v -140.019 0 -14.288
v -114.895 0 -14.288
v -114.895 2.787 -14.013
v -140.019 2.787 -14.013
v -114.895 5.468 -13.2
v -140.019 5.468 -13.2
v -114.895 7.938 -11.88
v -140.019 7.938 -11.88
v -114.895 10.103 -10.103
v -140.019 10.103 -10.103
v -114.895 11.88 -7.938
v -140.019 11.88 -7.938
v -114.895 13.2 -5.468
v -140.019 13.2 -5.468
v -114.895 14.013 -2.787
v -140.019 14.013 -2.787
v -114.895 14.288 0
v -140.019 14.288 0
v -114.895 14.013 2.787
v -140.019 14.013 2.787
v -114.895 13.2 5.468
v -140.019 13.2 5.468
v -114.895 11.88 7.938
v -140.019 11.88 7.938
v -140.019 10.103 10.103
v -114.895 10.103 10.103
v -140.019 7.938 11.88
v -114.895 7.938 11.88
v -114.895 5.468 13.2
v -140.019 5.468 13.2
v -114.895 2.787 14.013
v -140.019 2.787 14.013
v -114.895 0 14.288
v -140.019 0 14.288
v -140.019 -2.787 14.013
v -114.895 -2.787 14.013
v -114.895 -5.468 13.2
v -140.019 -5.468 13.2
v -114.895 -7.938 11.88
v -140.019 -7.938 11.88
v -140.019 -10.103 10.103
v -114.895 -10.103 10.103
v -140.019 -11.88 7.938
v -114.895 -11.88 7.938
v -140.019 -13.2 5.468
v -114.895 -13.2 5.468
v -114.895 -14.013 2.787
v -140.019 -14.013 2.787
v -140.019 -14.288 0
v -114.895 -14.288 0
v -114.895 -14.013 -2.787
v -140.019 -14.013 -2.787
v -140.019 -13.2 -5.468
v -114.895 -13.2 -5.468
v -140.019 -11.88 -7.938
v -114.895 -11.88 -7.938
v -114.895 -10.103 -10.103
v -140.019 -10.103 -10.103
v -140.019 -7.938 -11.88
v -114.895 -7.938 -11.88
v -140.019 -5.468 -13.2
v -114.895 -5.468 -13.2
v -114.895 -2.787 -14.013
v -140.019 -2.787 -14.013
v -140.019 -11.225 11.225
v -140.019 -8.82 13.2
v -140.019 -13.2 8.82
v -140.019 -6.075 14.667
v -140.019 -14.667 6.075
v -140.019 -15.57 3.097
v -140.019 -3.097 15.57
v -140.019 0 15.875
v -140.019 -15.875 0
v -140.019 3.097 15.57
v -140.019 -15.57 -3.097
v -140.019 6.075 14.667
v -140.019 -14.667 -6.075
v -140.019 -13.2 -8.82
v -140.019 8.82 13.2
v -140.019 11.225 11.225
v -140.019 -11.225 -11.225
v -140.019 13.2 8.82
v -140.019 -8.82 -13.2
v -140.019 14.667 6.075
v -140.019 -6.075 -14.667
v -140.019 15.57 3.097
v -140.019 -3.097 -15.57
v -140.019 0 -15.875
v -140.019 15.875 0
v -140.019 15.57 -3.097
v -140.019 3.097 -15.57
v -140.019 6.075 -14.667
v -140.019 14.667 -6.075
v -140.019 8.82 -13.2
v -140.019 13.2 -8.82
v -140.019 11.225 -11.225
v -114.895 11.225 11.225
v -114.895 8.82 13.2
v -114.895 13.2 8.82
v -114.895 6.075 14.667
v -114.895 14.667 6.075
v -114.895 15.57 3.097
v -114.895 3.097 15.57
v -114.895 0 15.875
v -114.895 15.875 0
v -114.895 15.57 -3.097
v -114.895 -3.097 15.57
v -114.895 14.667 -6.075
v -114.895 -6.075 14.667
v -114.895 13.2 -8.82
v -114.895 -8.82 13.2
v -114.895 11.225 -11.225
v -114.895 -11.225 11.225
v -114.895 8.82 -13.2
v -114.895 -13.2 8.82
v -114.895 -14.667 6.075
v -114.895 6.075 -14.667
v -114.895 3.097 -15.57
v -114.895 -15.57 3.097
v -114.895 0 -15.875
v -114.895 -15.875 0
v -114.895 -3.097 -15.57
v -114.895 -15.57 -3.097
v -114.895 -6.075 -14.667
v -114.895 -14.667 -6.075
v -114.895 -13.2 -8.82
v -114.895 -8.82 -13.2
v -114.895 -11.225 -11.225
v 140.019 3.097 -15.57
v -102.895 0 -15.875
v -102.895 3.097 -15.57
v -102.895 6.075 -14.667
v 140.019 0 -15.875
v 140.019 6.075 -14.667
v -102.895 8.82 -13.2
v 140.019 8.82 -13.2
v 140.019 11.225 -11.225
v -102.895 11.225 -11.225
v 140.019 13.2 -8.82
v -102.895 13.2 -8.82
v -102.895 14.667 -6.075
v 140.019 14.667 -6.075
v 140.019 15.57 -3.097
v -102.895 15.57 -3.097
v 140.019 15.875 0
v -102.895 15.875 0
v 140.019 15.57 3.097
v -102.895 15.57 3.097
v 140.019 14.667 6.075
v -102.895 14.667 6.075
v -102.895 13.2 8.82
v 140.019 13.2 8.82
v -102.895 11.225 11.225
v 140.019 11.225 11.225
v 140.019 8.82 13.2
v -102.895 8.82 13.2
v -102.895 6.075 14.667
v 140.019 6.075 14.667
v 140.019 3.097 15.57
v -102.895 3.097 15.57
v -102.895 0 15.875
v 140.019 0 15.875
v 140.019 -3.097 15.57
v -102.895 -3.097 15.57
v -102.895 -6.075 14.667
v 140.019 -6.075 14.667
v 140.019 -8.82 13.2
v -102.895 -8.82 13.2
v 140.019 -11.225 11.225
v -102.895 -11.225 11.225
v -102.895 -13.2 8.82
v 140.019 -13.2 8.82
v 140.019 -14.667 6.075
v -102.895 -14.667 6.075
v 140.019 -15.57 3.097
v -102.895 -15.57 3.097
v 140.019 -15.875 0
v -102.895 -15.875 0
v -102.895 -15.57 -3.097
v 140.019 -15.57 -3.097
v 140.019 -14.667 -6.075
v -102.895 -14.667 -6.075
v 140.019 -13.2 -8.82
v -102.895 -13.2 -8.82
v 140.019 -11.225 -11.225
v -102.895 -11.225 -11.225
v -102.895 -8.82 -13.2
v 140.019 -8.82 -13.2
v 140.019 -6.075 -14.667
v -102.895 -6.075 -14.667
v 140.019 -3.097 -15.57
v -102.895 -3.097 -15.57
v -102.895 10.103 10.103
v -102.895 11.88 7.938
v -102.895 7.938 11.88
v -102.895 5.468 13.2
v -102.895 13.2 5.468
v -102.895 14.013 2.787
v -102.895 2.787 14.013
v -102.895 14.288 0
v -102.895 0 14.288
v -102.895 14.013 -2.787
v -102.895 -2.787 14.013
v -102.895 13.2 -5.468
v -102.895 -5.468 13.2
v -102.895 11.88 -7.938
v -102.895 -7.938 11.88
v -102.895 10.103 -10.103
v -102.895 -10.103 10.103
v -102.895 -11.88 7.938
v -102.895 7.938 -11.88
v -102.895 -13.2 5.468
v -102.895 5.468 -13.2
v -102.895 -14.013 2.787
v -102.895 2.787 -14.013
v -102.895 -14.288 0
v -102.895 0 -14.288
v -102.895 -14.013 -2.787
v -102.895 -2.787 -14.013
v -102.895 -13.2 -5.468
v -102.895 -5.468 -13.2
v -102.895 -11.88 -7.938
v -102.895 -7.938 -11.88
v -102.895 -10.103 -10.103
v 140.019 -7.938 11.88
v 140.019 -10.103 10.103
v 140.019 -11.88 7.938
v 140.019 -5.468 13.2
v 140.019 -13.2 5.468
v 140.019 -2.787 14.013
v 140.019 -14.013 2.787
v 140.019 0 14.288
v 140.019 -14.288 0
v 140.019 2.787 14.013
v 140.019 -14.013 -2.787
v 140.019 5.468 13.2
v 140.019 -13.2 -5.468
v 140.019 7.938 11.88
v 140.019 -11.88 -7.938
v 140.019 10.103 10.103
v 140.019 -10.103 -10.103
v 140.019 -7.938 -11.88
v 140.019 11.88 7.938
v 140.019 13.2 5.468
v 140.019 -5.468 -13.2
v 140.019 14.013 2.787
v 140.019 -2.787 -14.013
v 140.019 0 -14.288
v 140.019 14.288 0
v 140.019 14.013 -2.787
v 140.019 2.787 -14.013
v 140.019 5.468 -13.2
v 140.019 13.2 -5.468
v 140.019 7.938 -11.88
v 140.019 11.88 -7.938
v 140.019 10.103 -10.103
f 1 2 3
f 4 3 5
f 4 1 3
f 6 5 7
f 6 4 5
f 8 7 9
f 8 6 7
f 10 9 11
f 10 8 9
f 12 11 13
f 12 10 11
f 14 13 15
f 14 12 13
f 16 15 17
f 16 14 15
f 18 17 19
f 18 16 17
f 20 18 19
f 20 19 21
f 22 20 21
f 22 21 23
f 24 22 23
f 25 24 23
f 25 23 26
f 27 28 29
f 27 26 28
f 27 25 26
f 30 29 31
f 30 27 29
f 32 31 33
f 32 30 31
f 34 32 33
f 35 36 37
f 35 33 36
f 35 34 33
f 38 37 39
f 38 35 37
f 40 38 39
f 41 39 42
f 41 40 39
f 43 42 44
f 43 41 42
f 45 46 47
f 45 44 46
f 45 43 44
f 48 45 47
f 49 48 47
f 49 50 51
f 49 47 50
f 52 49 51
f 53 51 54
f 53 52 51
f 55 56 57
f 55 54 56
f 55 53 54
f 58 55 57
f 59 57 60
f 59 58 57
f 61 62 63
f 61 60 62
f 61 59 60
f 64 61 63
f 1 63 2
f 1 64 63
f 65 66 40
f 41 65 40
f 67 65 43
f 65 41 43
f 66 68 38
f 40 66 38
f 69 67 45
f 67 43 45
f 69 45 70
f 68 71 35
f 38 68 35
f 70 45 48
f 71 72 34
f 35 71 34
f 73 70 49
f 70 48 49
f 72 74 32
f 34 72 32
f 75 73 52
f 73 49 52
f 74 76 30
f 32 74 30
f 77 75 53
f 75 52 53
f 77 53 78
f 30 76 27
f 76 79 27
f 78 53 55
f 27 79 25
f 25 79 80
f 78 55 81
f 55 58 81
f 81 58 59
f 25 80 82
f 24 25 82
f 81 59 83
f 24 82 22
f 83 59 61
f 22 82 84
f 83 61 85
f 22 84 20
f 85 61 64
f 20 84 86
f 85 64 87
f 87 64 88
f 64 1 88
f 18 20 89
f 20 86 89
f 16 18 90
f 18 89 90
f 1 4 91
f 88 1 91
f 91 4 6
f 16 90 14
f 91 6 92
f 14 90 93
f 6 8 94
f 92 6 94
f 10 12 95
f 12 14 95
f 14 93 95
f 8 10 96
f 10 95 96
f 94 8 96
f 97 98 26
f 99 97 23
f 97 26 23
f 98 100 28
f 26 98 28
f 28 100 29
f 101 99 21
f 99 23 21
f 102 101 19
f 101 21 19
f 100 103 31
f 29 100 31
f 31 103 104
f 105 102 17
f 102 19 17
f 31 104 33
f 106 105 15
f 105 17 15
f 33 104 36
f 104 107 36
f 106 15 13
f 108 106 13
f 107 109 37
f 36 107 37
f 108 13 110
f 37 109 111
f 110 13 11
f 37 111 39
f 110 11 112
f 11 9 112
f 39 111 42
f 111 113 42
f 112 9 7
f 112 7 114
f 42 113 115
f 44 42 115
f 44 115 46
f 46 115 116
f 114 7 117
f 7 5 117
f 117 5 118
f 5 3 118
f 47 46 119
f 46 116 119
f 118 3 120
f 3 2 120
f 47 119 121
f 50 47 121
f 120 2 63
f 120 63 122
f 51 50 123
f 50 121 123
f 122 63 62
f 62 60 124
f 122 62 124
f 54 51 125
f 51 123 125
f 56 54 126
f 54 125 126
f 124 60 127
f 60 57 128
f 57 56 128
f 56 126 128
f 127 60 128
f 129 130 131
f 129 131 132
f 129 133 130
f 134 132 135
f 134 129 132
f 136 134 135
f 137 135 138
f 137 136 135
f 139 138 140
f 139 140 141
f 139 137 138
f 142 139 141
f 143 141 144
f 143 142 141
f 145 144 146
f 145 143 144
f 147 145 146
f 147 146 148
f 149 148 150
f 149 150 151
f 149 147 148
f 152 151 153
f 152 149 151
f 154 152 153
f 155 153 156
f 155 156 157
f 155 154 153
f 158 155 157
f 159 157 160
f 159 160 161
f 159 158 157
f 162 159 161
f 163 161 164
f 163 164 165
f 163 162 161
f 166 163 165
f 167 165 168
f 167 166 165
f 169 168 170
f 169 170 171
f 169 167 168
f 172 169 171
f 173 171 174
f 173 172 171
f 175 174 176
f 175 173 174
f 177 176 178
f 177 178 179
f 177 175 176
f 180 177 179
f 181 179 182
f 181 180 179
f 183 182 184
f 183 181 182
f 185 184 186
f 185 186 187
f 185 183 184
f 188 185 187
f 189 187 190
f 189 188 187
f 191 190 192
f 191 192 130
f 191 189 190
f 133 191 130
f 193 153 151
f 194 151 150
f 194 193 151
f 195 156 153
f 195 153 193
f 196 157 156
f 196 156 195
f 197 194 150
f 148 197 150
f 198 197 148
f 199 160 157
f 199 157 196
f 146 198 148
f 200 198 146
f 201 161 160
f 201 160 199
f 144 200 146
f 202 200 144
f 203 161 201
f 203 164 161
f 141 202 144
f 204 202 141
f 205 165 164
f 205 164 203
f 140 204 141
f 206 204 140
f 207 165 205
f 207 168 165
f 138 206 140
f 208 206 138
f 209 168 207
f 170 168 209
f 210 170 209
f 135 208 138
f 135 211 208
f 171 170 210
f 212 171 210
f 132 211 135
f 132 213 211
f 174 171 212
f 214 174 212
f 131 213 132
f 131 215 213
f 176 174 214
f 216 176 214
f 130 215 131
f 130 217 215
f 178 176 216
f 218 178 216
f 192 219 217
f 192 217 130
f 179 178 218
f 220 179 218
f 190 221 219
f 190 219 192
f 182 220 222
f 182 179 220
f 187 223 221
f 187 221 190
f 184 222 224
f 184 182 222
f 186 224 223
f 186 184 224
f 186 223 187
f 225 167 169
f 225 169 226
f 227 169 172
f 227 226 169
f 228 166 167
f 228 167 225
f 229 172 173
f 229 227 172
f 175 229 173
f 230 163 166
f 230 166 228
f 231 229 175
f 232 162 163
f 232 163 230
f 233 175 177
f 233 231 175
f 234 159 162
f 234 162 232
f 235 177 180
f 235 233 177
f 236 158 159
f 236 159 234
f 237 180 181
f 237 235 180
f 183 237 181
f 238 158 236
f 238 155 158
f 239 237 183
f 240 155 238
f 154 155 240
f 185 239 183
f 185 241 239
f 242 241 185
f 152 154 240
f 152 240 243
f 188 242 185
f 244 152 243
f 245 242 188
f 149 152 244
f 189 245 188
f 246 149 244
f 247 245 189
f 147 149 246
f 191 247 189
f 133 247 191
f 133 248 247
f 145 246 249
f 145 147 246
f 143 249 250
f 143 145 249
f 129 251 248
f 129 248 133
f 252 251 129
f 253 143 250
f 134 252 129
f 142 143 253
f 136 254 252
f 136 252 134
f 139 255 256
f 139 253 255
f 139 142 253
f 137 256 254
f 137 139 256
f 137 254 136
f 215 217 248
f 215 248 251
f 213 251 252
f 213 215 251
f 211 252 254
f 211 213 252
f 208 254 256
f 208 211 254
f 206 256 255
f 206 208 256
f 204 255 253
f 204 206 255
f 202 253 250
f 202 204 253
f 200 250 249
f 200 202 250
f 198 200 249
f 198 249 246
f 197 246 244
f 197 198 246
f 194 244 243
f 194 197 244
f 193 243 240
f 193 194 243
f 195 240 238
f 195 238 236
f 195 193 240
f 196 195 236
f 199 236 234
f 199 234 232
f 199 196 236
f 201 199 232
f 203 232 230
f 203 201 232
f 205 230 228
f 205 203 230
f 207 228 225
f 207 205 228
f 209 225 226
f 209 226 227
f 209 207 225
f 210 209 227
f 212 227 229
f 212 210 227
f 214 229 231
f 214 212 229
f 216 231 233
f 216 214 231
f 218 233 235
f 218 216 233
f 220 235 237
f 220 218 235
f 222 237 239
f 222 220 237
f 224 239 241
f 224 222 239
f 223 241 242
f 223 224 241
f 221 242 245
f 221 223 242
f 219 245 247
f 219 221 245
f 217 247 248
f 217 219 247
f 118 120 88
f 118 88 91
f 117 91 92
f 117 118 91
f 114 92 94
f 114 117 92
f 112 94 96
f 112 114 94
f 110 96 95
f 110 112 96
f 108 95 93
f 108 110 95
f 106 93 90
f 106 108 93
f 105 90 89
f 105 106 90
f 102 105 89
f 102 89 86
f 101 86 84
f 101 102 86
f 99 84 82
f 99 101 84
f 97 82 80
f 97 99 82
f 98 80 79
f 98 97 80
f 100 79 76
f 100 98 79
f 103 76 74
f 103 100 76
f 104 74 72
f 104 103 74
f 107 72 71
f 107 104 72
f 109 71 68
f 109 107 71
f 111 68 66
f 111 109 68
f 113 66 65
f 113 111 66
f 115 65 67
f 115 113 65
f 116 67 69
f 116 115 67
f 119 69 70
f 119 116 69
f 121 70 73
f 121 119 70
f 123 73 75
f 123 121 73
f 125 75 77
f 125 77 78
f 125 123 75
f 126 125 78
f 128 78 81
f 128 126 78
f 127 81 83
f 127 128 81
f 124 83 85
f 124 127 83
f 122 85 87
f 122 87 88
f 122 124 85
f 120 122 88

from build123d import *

# Parameters (mm, degrees)
SKETCH1_R               = 15.875
SKETCH1_R_2             = 14.2875
EXTRUDE_THIN1_DEPTH     = 140.019255902
CUT_EXTRUDE1_DEPTH      = 142.807698216
CUT_EXTRUDE1_DEPTH_BACK = 142.807698216
SKETCH2_W               = 11.999999876
SKETCH2_H               = 31.75


with BuildPart() as part:
    # Sketch1 → Extrude-Thin1 (new, symmetric)
    with BuildSketch(Plane(origin=(0, 0, 0), x_dir=(0, 0, -1), z_dir=(1, 0, 0))):
        Circle(SKETCH1_R)
        Circle(SKETCH1_R_2, mode=Mode.SUBTRACT)
    extrude(amount=EXTRUDE_THIN1_DEPTH, both=True)

    # Sketch2 → Cut-Extrude1 (cut, two sides: drawn at the far end of the back side and taken through both)
    with BuildSketch(Plane(origin=(0, 0, 0), x_dir=(1, 0, 0), z_dir=(0, 1, 0)).offset(-CUT_EXTRUDE1_DEPTH_BACK)):
        with Locations((-108.895311038, 0)):
            Rectangle(SKETCH2_W, SKETCH2_H)
    extrude(amount=CUT_EXTRUDE1_DEPTH + CUT_EXTRUDE1_DEPTH_BACK, mode=Mode.SUBTRACT)


with BuildPart() as cut_extrude1_piece_1:
    # of the separate pieces the step leaves, piece 1, a body of its own (cut_extrude1_pieces)
    add(part.part.solids().sort_by_distance((-102.8953111, 0, -15.875))[0])


with BuildPart() as cut_extrude1_piece_2:
    # of the separate pieces the step leaves, piece 2, a body of its own (cut_extrude1_pieces)
    add(part.part.solids().sort_by_distance((-140.019255902, 0, -15.875))[0])


solid = Compound([cut_extrude1_piece_1.part, cut_extrude1_piece_2.part])
